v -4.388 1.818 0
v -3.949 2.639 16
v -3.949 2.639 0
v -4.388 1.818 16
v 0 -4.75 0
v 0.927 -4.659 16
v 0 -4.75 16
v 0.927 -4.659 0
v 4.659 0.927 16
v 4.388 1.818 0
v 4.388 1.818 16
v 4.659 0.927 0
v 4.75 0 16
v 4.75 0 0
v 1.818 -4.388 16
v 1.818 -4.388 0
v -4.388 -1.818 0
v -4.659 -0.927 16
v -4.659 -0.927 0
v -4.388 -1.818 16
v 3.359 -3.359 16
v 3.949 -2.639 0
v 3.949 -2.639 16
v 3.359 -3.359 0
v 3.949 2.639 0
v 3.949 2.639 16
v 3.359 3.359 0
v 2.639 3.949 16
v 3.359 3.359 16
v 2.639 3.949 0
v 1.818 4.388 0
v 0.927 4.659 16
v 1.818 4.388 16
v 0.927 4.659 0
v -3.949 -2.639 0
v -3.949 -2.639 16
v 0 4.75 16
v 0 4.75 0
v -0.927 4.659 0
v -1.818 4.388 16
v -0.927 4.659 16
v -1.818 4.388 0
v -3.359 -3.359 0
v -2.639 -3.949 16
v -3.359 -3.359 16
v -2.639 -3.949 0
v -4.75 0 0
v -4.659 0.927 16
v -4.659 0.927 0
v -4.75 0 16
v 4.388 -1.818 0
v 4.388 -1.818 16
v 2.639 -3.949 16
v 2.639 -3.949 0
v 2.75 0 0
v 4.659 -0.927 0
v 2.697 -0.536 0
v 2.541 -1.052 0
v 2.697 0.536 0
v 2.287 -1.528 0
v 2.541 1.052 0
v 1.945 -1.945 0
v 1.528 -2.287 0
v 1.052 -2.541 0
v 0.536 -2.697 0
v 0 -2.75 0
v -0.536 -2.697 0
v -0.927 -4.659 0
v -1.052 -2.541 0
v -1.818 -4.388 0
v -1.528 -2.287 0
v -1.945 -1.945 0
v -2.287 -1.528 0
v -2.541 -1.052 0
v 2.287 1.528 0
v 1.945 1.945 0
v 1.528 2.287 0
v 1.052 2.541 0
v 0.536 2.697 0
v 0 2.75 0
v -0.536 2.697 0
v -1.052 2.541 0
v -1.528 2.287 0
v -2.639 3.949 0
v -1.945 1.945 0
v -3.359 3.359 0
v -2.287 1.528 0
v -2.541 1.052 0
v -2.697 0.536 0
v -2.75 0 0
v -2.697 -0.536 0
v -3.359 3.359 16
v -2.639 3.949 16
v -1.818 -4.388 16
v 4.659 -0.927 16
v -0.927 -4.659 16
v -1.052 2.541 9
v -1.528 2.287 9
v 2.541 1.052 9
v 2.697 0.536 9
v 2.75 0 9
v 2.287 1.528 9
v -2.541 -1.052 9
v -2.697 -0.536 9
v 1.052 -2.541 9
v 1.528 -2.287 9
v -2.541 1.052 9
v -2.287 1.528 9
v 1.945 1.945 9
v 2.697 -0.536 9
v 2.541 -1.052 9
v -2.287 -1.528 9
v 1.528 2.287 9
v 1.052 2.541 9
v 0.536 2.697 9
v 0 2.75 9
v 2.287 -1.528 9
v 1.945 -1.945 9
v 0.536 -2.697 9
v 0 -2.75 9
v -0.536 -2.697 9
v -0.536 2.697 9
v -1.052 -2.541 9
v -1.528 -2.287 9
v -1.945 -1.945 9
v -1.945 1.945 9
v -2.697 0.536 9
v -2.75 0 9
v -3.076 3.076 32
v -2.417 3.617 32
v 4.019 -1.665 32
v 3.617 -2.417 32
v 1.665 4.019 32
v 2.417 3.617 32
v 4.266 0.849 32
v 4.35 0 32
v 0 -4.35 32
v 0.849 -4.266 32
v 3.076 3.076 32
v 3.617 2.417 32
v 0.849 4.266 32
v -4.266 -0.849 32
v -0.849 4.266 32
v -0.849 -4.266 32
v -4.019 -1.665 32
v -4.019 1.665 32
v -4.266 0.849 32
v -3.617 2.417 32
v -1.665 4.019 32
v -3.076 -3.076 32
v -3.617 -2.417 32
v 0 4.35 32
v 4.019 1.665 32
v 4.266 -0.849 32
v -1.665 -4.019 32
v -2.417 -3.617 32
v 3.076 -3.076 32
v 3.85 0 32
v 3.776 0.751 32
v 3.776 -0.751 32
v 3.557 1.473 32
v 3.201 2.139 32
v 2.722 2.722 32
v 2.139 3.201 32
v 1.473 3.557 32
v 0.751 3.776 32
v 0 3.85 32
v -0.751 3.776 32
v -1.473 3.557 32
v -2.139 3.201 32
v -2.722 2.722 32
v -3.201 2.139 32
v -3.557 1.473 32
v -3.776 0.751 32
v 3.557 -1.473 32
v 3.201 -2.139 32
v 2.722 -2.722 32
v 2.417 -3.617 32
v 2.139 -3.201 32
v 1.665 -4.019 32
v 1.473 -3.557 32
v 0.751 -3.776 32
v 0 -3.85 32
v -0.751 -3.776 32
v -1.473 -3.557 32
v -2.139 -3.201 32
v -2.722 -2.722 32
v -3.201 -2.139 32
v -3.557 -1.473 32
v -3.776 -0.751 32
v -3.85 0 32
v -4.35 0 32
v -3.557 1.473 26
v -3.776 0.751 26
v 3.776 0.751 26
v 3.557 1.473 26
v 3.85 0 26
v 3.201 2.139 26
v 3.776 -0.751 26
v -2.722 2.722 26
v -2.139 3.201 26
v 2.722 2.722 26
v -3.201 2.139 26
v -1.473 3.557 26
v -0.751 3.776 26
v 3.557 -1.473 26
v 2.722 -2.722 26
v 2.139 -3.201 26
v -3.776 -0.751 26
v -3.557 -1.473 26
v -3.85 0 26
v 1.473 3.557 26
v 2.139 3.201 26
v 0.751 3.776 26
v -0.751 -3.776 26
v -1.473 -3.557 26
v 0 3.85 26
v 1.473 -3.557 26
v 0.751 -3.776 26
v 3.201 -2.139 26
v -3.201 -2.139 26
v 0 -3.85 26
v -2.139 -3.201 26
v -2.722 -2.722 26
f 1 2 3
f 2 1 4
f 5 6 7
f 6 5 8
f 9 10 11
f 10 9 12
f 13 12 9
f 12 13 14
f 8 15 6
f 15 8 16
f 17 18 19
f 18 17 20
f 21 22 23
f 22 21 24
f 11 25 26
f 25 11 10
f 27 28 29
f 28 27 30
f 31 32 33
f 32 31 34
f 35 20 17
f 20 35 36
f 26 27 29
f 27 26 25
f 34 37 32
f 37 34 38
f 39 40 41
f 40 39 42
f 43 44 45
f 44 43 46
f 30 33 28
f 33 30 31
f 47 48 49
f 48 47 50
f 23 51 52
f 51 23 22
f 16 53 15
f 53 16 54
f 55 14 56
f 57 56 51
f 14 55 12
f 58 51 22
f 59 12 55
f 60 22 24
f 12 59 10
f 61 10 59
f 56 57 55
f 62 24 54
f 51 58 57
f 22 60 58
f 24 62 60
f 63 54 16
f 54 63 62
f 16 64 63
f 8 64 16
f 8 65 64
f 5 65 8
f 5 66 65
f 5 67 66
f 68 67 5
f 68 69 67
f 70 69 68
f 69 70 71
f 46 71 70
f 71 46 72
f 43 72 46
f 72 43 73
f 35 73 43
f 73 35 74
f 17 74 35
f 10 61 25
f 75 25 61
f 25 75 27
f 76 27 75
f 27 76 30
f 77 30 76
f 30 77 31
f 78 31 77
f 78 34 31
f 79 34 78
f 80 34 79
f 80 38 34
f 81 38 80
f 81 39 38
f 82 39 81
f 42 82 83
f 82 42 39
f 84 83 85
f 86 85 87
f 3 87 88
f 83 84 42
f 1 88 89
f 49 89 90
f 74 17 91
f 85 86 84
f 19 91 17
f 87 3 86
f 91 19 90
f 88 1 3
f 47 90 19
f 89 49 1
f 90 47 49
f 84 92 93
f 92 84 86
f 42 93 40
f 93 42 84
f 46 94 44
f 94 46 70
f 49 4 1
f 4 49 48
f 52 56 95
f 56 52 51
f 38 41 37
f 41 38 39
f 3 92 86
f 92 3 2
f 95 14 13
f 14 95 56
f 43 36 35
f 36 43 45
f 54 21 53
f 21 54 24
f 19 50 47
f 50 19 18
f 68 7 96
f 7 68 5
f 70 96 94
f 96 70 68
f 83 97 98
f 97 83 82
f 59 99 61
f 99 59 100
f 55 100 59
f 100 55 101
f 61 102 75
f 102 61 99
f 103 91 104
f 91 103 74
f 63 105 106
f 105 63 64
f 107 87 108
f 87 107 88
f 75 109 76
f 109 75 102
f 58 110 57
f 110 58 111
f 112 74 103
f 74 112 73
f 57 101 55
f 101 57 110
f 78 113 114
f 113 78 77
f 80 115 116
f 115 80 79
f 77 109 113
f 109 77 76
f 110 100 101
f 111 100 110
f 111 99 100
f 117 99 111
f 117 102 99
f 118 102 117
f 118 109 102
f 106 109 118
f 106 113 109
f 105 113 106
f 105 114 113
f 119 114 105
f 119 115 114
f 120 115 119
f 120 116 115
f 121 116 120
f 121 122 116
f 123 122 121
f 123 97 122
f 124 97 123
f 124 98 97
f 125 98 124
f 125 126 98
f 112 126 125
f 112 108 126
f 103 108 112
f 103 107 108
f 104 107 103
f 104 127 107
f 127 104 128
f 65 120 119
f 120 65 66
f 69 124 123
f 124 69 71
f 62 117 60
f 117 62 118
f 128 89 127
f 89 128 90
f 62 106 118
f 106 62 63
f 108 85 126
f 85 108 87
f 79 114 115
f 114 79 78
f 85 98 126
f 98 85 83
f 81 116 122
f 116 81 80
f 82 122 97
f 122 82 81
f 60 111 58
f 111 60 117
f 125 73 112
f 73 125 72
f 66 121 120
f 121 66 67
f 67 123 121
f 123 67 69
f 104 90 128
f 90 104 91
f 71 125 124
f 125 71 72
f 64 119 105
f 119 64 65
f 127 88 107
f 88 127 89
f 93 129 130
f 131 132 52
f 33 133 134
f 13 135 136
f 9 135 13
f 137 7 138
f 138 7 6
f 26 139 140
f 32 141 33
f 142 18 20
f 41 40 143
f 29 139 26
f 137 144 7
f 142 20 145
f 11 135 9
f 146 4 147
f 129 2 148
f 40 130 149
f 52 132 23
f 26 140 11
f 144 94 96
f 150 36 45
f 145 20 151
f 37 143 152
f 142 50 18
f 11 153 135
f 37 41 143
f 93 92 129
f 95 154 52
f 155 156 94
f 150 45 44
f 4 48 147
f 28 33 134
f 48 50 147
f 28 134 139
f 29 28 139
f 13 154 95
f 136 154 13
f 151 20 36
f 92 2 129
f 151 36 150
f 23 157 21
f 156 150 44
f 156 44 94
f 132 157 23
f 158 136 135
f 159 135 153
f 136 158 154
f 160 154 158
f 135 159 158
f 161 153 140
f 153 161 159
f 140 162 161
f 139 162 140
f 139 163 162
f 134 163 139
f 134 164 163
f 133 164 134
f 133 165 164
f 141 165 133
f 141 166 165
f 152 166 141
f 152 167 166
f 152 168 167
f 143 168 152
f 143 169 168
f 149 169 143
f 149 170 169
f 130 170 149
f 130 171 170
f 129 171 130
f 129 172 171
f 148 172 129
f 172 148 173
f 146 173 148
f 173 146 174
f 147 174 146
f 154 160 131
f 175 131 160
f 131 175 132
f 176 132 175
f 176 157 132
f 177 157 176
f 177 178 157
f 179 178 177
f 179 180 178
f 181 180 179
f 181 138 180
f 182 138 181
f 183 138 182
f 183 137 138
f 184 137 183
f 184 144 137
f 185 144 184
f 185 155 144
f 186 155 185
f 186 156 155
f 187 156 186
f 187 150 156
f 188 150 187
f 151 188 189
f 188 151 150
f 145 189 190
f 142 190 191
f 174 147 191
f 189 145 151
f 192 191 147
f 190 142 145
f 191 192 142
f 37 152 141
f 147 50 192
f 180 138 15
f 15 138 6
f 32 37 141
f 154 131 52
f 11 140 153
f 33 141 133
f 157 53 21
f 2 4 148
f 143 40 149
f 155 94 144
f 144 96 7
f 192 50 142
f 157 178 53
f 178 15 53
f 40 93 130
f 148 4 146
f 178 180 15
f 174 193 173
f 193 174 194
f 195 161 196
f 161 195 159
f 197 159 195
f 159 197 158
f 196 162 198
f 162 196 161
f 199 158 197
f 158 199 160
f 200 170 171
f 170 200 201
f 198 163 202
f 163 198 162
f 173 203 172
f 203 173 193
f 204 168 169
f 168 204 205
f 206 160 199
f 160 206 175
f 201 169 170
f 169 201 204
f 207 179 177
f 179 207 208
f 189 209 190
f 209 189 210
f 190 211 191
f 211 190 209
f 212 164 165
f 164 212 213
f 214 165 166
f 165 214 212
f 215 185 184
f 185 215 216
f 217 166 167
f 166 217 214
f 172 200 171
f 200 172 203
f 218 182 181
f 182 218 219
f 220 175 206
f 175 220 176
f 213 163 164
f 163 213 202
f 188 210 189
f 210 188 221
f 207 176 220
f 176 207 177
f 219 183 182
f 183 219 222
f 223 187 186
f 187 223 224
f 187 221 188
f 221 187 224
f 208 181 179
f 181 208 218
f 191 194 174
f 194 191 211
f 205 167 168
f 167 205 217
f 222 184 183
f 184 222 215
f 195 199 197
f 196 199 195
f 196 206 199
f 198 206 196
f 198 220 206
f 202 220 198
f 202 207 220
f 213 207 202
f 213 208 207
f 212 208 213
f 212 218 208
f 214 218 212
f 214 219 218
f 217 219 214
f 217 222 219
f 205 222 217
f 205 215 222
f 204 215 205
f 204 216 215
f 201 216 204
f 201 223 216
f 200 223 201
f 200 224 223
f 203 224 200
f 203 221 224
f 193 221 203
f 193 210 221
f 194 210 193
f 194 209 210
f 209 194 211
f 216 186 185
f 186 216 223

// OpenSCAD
//-- Parametric Traxxas 5347 carbon fiber rod connector
//-- Parametric: rod diameter can be adjusted as well as length and tolerance
//-- Assembly requires epoxy glue.
//-- AndrewBCN - Barcelona - March 2015
//-- GPLV3
//-- Please read the terms of the GPLV3 and please comply with it
//-- if remixing this part. Thank you.


// Parameters

// Rod diameter
Rod_diam=5; // [5:8]

// Part additional length
add_len=30; // [30:40]

// Print tolerance
tolerance=0.5; // [0.0,0.1,0.2,0.3,0.5]

/* [Hidden] */
$fn=32;

diam1=Rod_diam+tolerance;
diam2=diam1+4; // 2mm walls
diam3=7.2+tolerance; // Traxxas diameter
diam4=diam3+1;

// really simple code

// bottom
difference() {
  cylinder(r=diam2/2, h=add_len-14);
  translate([0,0,-0.1]) cylinder(r=diam1/2, h=9.1);
}
// top
difference() {
  translate([0,0,add_len-14]) cylinder(r1=diam2/2, r2=diam4/2, h=16);
  translate([0,0,add_len-4]) cylinder(r=diam3/2, h=8);
}
